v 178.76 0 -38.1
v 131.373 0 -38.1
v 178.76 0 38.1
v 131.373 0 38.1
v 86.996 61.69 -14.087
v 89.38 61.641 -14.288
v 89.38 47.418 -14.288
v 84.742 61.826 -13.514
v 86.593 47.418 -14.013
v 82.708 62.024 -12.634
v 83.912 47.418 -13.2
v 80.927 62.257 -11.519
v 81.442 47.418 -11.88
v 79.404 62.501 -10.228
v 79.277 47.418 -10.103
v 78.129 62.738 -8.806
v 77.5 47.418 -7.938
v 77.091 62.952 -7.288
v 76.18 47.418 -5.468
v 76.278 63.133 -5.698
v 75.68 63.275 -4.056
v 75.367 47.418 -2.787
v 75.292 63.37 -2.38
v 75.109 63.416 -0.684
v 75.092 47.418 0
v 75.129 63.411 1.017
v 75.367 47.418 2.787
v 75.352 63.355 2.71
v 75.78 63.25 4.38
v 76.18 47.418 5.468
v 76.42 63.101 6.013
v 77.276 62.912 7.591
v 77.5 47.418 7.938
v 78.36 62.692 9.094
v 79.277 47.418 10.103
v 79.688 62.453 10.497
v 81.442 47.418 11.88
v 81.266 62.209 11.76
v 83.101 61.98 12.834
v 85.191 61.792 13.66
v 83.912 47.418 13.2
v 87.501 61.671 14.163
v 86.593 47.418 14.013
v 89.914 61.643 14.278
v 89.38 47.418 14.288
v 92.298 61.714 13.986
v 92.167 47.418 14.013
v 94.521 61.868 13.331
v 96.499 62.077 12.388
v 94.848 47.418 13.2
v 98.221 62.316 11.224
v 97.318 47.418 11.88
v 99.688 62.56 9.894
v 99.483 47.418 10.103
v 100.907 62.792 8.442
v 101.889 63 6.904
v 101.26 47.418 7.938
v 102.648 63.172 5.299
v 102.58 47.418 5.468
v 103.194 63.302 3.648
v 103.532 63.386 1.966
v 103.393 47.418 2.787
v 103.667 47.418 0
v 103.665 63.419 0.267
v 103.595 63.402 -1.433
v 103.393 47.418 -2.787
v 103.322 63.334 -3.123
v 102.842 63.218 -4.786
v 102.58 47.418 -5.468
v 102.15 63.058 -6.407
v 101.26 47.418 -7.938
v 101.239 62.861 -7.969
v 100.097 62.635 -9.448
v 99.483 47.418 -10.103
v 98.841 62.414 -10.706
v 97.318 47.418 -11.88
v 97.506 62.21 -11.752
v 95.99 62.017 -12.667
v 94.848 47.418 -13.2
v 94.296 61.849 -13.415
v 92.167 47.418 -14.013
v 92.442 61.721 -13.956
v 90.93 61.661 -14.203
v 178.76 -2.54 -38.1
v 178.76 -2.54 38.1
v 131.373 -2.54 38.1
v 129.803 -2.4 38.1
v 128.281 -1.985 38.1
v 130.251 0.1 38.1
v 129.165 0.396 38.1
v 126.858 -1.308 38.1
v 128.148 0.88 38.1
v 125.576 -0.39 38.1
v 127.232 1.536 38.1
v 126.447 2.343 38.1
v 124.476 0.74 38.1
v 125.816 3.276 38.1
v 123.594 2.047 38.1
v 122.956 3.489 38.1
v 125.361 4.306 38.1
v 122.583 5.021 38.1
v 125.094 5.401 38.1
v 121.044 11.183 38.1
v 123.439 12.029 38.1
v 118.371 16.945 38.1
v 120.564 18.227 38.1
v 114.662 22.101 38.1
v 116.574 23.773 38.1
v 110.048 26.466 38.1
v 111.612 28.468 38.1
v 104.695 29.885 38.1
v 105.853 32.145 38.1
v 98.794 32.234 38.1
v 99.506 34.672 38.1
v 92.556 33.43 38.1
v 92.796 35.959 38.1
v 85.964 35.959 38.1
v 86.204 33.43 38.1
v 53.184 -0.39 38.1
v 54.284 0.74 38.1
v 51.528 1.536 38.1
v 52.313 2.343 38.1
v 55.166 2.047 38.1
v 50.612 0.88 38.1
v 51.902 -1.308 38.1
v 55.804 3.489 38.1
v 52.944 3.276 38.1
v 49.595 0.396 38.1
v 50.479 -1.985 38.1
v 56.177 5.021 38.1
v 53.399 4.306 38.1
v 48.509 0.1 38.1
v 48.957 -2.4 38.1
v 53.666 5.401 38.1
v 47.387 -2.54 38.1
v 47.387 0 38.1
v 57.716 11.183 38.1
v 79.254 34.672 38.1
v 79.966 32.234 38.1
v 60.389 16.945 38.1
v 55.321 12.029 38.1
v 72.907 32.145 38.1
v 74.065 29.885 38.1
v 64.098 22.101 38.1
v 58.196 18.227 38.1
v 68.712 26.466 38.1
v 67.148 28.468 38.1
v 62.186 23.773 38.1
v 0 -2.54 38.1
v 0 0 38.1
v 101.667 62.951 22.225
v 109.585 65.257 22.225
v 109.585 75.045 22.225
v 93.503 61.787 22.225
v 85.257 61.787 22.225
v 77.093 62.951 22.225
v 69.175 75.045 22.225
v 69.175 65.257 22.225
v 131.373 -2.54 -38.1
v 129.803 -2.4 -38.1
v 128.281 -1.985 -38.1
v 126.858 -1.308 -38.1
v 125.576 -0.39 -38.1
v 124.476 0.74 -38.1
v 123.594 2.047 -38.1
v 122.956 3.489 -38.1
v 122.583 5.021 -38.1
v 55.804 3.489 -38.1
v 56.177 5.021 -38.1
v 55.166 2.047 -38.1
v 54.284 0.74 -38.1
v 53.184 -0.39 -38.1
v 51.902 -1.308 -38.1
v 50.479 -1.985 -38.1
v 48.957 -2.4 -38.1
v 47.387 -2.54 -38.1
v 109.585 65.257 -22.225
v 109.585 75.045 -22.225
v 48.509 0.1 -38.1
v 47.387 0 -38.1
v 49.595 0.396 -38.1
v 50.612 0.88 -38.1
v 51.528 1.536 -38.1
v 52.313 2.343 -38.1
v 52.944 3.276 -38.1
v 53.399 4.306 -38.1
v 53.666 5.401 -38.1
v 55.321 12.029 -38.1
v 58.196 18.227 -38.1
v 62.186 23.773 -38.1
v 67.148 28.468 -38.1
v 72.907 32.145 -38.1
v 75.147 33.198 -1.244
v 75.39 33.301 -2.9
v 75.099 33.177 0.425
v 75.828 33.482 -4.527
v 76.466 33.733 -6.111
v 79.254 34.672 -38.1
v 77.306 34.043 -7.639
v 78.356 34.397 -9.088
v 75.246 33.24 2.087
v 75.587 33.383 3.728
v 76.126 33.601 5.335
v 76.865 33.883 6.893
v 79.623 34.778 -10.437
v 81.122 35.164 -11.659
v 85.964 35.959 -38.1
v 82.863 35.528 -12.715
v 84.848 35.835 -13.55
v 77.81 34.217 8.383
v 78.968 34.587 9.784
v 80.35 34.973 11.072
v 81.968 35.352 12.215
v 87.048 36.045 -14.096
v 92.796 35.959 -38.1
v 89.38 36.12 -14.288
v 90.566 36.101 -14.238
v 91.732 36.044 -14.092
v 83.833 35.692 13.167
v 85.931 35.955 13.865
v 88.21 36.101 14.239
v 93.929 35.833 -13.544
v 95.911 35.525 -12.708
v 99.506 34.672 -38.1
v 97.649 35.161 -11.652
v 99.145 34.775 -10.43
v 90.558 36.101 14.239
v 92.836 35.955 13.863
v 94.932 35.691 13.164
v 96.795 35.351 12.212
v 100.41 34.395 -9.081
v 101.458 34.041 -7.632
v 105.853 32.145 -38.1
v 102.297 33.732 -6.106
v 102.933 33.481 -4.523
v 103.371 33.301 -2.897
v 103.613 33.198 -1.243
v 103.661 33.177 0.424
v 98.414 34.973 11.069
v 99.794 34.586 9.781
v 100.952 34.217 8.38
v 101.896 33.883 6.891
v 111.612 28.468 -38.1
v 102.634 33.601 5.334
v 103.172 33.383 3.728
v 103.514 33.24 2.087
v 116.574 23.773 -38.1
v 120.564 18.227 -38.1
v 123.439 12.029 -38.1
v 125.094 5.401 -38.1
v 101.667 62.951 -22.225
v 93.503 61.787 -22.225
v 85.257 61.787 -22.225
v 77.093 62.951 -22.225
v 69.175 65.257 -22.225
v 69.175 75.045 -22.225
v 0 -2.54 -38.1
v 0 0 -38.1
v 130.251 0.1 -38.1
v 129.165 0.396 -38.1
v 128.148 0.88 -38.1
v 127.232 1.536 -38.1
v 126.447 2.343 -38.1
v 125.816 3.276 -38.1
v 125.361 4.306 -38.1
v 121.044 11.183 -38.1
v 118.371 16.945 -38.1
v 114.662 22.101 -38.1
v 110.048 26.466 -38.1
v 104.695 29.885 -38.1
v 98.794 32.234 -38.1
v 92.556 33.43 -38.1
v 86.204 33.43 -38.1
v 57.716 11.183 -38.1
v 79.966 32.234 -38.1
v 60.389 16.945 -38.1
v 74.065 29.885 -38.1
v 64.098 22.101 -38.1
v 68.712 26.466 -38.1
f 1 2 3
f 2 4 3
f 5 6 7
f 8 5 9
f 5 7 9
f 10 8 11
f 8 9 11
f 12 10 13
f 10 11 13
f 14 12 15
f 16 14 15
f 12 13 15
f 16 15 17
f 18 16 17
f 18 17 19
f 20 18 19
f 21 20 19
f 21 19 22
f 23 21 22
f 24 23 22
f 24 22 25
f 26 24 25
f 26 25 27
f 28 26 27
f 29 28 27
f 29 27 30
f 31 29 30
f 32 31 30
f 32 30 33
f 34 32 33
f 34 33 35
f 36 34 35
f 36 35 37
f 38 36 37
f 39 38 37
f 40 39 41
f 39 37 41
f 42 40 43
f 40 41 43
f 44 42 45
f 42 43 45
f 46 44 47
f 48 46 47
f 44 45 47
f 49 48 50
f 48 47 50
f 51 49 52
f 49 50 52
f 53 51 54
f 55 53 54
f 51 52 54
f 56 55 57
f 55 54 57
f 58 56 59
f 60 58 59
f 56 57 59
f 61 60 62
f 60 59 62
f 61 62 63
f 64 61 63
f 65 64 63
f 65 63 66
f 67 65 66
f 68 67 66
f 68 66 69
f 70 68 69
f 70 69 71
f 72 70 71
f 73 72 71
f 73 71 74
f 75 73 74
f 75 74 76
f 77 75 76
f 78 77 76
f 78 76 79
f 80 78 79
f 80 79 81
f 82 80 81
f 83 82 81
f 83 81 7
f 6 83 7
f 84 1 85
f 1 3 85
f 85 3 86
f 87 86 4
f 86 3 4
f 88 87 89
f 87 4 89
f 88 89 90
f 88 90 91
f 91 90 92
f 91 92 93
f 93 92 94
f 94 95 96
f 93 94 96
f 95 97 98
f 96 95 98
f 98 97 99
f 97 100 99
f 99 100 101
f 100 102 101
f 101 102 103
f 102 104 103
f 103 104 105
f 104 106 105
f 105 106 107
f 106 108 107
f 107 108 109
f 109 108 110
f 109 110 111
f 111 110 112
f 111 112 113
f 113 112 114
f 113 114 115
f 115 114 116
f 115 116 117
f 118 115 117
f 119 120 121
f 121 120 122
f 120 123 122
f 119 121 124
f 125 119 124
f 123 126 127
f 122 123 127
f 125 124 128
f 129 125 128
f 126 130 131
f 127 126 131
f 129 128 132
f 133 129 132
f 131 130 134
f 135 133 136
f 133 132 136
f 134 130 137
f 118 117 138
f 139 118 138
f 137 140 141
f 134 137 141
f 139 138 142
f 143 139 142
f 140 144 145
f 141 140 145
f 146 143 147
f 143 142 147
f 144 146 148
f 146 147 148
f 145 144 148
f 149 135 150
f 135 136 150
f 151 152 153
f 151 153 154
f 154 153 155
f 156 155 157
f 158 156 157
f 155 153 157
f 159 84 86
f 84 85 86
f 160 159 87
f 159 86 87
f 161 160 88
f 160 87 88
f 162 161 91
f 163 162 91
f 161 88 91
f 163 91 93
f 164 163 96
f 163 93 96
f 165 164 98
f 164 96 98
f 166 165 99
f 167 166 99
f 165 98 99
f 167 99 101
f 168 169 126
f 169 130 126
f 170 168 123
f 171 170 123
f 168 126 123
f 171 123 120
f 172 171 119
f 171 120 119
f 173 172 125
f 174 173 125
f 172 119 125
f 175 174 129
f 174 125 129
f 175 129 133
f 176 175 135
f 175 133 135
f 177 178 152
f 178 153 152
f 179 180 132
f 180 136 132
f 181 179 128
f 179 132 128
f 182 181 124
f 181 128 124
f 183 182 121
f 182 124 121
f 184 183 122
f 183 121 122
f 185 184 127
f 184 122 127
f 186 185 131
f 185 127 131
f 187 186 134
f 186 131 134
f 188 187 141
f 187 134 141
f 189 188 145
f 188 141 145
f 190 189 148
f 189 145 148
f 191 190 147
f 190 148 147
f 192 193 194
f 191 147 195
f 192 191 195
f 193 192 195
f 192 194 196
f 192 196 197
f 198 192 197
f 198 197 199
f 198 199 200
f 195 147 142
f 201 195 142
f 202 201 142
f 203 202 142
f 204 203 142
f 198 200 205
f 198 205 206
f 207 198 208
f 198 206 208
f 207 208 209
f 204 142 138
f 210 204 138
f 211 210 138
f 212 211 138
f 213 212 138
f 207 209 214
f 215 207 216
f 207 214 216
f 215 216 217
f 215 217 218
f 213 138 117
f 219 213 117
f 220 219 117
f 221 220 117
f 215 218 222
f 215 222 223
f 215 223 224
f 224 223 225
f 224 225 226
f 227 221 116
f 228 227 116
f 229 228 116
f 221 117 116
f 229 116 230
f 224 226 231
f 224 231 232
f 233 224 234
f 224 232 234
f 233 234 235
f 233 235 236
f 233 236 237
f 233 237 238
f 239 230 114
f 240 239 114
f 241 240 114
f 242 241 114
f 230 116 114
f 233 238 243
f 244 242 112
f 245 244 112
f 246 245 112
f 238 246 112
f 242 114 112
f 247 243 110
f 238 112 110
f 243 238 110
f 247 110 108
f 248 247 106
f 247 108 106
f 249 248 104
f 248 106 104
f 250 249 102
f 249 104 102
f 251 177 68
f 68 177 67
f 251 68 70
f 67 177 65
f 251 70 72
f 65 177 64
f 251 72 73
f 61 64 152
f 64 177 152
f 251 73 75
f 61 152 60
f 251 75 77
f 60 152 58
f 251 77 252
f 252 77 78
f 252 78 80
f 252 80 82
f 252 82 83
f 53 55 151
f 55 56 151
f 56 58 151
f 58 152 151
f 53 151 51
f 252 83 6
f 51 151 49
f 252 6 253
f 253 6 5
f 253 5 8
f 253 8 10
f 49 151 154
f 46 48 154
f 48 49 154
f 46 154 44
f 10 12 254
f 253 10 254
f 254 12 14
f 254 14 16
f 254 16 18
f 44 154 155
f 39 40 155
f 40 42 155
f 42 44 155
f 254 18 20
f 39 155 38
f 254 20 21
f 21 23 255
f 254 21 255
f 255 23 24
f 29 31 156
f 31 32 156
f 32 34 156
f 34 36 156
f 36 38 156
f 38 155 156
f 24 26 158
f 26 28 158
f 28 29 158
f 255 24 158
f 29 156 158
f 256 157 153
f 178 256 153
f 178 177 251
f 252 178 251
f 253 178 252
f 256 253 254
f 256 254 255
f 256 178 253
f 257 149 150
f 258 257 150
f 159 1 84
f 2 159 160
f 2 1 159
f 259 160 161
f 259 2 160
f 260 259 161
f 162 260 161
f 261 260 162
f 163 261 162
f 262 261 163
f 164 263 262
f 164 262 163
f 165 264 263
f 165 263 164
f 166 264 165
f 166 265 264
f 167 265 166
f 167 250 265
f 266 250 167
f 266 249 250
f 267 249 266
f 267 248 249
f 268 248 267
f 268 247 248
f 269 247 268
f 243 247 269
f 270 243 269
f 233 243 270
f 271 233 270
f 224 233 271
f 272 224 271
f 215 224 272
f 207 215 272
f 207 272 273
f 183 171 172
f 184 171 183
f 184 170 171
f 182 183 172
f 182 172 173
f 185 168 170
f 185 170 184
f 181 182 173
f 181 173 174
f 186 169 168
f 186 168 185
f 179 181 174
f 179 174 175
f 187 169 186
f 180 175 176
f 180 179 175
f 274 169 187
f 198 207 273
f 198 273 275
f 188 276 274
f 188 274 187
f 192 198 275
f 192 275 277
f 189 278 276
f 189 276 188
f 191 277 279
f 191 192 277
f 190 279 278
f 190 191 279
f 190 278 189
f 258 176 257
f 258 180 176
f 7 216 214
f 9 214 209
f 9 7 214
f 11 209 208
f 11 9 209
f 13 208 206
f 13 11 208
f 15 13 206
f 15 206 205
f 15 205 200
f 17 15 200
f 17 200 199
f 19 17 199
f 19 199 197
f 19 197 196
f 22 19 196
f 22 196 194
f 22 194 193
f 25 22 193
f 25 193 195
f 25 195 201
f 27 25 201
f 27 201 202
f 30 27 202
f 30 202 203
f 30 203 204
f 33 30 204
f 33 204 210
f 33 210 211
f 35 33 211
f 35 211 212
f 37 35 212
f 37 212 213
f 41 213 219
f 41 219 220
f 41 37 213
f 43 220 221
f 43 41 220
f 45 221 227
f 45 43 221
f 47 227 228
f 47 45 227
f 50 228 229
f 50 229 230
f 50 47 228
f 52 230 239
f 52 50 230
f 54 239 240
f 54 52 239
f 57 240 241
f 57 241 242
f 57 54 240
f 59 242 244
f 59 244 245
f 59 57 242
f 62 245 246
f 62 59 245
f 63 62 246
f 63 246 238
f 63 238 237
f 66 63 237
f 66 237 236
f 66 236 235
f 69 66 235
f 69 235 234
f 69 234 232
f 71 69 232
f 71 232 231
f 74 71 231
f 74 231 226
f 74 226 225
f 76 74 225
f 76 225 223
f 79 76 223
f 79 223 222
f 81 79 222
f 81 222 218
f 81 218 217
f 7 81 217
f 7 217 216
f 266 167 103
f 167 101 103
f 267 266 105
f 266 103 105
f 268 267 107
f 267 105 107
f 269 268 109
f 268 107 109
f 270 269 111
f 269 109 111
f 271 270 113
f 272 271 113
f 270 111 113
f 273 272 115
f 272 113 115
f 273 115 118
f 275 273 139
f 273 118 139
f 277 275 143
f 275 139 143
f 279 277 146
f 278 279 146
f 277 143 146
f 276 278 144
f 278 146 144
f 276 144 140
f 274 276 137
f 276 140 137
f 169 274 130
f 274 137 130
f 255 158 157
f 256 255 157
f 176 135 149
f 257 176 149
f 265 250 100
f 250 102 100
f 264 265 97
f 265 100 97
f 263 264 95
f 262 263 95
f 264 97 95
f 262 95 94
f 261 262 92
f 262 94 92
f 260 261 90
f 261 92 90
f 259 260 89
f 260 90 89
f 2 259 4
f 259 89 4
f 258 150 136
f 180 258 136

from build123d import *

# Parameters (mm, degrees)
EXTRUDE_THIN1_DEPTH             = 38.1
EXTRUDE1_DEPTH                  = 22.225
EXTRUDE2_REACH                  = 191.48
EXTRUDE2_END_RADIUS             = 58.254302176
SKETCH3_R                       = 14.2875
EXTRUDE2_DIRECTION_2_REACH      = 191.48
EXTRUDE2_DIRECTION_2_END_RADIUS = 36.120408138


with BuildPart() as part:
    # Sketch1 → Extrude-Thin1 (new, symmetric)
    with BuildSketch(Plane.XY):
        with BuildLine():
            Line((0, 0), (47.386965401, 0))
            ThreePointArc((47.386965401, 0), (51.527837673, 1.535887743), (53.665587121, 5.400574229))
            ThreePointArc((53.665587121, 5.400574229), (89.379977527, 36.120408138), (125.094367933, 5.400574229))
            ThreePointArc((125.094367933, 5.400574229), (127.232117381, 1.535887743), (131.372989653, 0))
            Line((131.372989653, 0), (178.759955054, 0))
            Line((178.759955054, 0), (178.759955054, -2.54))
            Line((178.759955054, -2.54), (131.372989653, -2.54))
            ThreePointArc((131.372989653, -2.54), (125.575768472, -0.38975716), (122.582919245, 5.02080392))
            ThreePointArc((122.582919245, 5.02080392), (89.379977527, 33.580408138), (56.177035809, 5.02080392))
            ThreePointArc((56.177035809, 5.02080392), (53.184186582, -0.38975716), (47.386965401, -2.54))
            Line((47.386965401, -2.54), (0, -2.54))
            Line((0, -2.54), (0, 0))
        make_face()
    extrude(amount=EXTRUDE_THIN1_DEPTH, both=True)



with BuildPart() as body_2:
    # Sketch2 → Extrude1 (new, symmetric)
    with BuildSketch(Plane.XY):
        with BuildLine():
            Line((69.175001958, 75.045019307), (109.584953096, 75.045019307))
            Line((109.584953096, 75.045019307), (109.584953096, 65.256940868))
            ThreePointArc((109.584953096, 65.256940868), (89.379977527, 61.640745213), (69.175001958, 65.256940868))
            Line((69.175001958, 65.256940868), (69.175001958, 75.045019307))
        make_face()
    extrude(amount=EXTRUDE1_DEPTH, both=True)


with BuildPart() as part_1:
    add(part.part)

    add(body_2.part)  # Extrude2 merges body 2
    # Extrude2: up to this cylinder (the profile starts outside it)
    extrude2_end = Plane(origin=(89.379977527, 119.89504739, 0), z_dir=(0, 0, -1)) * Cylinder(EXTRUDE2_END_RADIUS, 500.468604353, mode=Mode.PRIVATE)
    # Sketch3 → Extrude2 (add, up to the surface)
    with BuildSketch(Plane(origin=(0, 47.418237056, 0), x_dir=(-1, 0, 0), z_dir=(0, 1, 0)), mode=Mode.PRIVATE) as extrude2_sk1:
        with Locations(Location((-89.379977527, 0, 0), (0, 0, 270))):
            Circle(SKETCH3_R)
    extrude2_tool1 = extrude(extrude2_sk1.sketch, amount=EXTRUDE2_REACH, mode=Mode.PRIVATE) - extrude2_end
    add(extrude2_tool1.solids().sort_by_distance((89.379978, 47.418237, 0))[0])

    # Extrude2 direction 2: up to this cylinder (the profile starts outside it)
    extrude2_direction_2_end = Plane(origin=(89.379977527, 0, 0), z_dir=(0, 0, -1)) * Cylinder(EXTRUDE2_DIRECTION_2_END_RADIUS, 456.200816276, mode=Mode.PRIVATE)
    # Sketch3 → Extrude2 direction 2 (add, up to the surface)
    with BuildSketch(Plane(origin=(0, 47.418237056, 0), x_dir=(-1, 0, 0), z_dir=(0, 1, 0)), mode=Mode.PRIVATE) as extrude2_direction_2_sk1:
        with Locations(Location((-89.379977527, 0, 0), (0, 0, 270))):
            Circle(SKETCH3_R)
    extrude2_direction_2_tool1 = extrude(extrude2_direction_2_sk1.sketch, amount=-EXTRUDE2_DIRECTION_2_REACH, mode=Mode.PRIVATE) - extrude2_direction_2_end
    add(extrude2_direction_2_tool1.solids().sort_by_distance((89.379978, 47.418237, 0))[0])


solid = part_1.part
